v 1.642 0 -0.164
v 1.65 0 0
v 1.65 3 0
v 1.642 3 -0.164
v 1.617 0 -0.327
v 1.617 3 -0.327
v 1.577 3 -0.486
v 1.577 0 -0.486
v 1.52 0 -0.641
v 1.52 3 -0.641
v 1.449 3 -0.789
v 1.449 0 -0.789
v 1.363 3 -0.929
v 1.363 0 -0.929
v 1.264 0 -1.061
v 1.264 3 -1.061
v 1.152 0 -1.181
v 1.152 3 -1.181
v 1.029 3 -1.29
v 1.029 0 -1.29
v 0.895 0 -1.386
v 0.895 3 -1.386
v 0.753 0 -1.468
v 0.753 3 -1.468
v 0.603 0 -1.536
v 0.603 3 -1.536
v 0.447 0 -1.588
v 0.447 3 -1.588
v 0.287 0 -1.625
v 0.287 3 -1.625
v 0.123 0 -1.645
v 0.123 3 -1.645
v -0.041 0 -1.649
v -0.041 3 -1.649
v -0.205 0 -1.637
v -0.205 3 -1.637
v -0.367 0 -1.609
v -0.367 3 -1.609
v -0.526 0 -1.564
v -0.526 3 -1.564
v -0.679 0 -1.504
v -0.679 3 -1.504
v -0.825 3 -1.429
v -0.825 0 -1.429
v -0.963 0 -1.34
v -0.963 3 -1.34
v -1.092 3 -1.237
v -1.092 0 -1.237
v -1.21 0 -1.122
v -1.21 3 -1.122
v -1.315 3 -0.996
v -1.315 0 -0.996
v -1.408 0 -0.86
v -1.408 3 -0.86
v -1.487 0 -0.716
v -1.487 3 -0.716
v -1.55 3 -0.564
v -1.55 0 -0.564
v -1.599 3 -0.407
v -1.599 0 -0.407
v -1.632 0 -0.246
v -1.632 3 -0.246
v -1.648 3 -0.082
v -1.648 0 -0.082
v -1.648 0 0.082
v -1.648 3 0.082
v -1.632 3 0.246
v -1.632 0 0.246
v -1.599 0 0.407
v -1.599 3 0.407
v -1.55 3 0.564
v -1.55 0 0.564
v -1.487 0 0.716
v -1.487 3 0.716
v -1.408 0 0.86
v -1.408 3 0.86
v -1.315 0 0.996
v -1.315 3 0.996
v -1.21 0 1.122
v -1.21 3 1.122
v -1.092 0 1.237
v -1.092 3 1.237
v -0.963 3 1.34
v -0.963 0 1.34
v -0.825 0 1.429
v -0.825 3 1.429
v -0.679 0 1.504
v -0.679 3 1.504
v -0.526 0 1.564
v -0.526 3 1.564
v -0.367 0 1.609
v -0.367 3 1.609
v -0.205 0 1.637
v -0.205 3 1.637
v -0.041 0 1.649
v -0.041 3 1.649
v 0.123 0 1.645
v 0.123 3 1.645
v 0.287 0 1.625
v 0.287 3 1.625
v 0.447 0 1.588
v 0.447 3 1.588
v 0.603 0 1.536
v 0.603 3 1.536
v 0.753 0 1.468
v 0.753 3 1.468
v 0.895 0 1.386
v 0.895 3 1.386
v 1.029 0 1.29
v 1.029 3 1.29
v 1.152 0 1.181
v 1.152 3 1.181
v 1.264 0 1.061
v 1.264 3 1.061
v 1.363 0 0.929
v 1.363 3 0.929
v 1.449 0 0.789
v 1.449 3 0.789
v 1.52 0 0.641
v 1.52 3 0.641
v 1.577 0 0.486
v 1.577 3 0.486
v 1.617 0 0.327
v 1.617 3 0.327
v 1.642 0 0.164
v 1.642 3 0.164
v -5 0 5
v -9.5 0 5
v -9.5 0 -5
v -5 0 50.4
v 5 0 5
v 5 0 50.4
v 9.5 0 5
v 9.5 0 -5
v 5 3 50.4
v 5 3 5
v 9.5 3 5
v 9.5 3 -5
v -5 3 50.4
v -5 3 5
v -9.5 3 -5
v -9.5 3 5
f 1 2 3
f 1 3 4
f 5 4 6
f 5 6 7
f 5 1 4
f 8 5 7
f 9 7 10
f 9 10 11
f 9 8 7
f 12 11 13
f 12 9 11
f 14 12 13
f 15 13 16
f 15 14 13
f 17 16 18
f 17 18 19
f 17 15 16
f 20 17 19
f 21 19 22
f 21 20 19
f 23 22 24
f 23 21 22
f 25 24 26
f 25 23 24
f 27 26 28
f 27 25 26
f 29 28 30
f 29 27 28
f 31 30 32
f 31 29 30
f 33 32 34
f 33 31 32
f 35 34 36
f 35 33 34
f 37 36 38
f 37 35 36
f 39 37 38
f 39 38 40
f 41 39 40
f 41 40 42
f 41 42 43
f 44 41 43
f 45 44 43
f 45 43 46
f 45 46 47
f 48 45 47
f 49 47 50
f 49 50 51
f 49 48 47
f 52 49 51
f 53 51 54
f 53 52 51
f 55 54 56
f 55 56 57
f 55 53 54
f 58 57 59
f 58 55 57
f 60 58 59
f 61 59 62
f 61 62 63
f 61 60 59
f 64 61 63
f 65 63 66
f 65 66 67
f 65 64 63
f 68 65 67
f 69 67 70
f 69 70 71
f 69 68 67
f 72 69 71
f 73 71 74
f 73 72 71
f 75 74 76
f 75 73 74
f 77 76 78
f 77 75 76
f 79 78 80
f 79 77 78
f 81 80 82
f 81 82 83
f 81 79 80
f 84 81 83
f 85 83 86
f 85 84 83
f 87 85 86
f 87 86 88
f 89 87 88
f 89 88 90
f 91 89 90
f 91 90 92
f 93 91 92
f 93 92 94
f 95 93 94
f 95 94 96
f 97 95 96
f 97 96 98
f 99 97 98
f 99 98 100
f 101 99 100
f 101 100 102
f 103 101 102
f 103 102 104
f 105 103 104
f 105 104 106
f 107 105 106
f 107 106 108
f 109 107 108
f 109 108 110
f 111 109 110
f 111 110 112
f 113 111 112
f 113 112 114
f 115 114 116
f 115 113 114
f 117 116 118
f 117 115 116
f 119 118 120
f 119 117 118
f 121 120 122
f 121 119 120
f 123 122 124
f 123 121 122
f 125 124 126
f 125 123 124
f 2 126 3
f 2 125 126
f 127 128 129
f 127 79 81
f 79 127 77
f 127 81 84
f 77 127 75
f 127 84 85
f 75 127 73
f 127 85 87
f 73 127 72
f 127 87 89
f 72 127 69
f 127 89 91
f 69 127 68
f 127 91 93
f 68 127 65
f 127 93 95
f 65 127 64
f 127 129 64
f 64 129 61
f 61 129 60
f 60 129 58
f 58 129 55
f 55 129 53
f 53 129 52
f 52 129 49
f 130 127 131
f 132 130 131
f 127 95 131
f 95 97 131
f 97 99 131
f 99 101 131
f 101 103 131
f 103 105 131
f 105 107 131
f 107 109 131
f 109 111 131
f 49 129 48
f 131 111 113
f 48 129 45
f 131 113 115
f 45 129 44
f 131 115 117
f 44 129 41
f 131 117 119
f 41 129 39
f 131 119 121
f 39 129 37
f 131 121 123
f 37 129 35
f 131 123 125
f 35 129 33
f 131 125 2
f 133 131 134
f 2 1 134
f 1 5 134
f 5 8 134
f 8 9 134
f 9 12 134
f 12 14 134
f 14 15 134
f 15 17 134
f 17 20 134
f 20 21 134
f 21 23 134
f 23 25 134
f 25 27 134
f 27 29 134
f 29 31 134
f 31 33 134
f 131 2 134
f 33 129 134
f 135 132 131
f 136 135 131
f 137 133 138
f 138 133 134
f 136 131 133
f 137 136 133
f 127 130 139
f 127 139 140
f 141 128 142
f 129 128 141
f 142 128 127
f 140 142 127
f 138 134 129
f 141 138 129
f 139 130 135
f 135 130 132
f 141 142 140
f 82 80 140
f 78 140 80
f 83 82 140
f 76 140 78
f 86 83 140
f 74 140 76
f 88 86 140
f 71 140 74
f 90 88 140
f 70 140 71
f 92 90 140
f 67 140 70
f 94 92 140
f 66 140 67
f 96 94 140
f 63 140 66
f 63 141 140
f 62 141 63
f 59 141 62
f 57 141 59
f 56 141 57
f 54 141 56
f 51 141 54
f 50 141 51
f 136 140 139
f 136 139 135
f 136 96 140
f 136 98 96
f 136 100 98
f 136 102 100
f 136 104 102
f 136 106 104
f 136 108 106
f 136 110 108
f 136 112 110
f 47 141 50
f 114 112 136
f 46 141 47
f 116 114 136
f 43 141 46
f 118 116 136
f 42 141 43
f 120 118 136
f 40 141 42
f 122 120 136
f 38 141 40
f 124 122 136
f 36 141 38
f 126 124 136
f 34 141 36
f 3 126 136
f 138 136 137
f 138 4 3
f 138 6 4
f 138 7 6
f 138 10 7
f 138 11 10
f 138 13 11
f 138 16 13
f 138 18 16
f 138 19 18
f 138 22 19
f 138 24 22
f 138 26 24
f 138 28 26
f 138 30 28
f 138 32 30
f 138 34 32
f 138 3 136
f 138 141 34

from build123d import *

# Parameters (mm, degrees)
SKETCH1_W           = 10
SKETCH1_H           = 55.4
SKETCH1_R           = 1.65
SKETCH1_W_2         = 4.5
SKETCH1_H_2         = 10
BOSS_EXTRUDE1_DEPTH = 3


with BuildPart() as part:
    # Sketch1 → Boss-Extrude1 (new body)
    with BuildSketch(Plane(origin=(0, 0, 0), x_dir=(1, 0, 0), z_dir=(0, 1, 0))):
        with Locations((0, -22.7)):
            Rectangle(SKETCH1_W, SKETCH1_H)
        Circle(SKETCH1_R, mode=Mode.SUBTRACT)
        with Locations((-7.25, 0)):
            Rectangle(SKETCH1_W_2, SKETCH1_H_2)
        with Locations((7.25, 0)):
            Rectangle(SKETCH1_W_2, SKETCH1_H_2)
    extrude(amount=BOSS_EXTRUDE1_DEPTH)


solid = part.part
